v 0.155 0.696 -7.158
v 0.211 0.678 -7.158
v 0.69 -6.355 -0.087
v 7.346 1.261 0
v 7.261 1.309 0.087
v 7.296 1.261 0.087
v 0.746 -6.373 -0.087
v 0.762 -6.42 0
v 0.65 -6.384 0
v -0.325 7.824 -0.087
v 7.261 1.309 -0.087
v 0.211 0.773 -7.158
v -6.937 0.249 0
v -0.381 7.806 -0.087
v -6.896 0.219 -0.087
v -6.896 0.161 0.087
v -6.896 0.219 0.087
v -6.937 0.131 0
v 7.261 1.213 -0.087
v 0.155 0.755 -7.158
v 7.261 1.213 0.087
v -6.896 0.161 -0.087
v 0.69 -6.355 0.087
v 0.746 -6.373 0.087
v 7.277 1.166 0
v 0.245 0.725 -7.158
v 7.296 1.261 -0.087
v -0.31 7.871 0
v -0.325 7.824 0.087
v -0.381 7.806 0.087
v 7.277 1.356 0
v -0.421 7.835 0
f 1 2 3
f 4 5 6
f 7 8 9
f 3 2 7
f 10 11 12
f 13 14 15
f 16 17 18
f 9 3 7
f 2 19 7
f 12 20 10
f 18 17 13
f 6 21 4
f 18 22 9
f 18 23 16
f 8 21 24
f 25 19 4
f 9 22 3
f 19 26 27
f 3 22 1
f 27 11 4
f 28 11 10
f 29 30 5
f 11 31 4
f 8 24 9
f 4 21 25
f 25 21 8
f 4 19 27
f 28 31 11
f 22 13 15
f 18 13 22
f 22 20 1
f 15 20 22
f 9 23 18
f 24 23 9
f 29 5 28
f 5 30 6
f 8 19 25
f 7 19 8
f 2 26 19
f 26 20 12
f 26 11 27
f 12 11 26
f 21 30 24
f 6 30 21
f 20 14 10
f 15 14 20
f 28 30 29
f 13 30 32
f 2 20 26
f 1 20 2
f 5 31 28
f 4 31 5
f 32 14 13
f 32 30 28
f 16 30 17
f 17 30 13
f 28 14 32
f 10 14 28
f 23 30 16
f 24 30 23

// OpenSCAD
// Auto-generated OpenSCAD file

    inner_points = 10*[[0.7245880980657288, 0.12609962772758243, 1.0181341605432133e-13], [-0.6855635385041695, 0.018990515700464568, -1.0181341605432133e-13], [0.07306683579433854, -0.6325307465709257, 7.388094116376098e-14], [-0.03404227623277932, 0.7776208899989726, -7.388094116376098e-14], [0.019512279780886727, 0.07254507171395753, -0.7071067811865476]];

    outer_points = 10*[[0.6006779226054043, 0.0, -0.37307644430392006], [-0.6006779226054043, 0.0, 0.37307644430392006], [-0.33233807096506035, 0.3213003592020604, -0.5350864283121461], [0.33233807096506035, -0.3213003592020604, 0.5350864283121461], [0.169521207763744, 0.6298937046650228, 0.2729404347869597]];

    // Convex hull for inner set (I)
    module inner_hull() {
        hull() {
            for (p = inner_points) {
                translate(p) sphere(r=0.1);
            }
        }
    }

    // Convex hull for outer set (O) minus inner hull (O \ I)
    module outer_minus_inner() {
        difference() {
            hull() {
                for (p = outer_points) {
                    translate(p) sphere(r=0.1);
                }
            }
            inner_hull(); // Subtract inner hull
        }
    }

    // Convex hull for outer set (O) minus all translated inner hulls
    module outer_minus_AllTranslationInner() {
        difference() {
            hull() {
                for (p = outer_points) {
                    translate(p) sphere(r=0.1);
                }
            }
            hull() {
                translate([0,0,50]) inner_hull();
                translate([0,0,-50]) inner_hull();
            }; // Subtract translated inner hulls
        }
    }

    // Difference between outer_minus_inner and outer_minus_AllTranslationInner
    module outer_minus_inner_diff() {
        difference() {
            // Outer minus inner
            difference() {
                hull() {
                    for (p = outer_points) {
                        translate(p) sphere(r=0.1);
                    }
                }
                inner_hull();
            }

            // Subtract Outer minus AllTranslationInner
            difference() {
                hull() {
                    for (p = outer_points) {
                        translate(p) sphere(r=0.1);
                    }
                }
                hull() {
                    translate([0,0,50]) inner_hull();
                    translate([0,0,-50]) inner_hull();
                };
            }
        }
    }

    // Rendering all with colors applied
    color([1, 0, 0, 0.5]) inner_hull(); // Transparent red
    
